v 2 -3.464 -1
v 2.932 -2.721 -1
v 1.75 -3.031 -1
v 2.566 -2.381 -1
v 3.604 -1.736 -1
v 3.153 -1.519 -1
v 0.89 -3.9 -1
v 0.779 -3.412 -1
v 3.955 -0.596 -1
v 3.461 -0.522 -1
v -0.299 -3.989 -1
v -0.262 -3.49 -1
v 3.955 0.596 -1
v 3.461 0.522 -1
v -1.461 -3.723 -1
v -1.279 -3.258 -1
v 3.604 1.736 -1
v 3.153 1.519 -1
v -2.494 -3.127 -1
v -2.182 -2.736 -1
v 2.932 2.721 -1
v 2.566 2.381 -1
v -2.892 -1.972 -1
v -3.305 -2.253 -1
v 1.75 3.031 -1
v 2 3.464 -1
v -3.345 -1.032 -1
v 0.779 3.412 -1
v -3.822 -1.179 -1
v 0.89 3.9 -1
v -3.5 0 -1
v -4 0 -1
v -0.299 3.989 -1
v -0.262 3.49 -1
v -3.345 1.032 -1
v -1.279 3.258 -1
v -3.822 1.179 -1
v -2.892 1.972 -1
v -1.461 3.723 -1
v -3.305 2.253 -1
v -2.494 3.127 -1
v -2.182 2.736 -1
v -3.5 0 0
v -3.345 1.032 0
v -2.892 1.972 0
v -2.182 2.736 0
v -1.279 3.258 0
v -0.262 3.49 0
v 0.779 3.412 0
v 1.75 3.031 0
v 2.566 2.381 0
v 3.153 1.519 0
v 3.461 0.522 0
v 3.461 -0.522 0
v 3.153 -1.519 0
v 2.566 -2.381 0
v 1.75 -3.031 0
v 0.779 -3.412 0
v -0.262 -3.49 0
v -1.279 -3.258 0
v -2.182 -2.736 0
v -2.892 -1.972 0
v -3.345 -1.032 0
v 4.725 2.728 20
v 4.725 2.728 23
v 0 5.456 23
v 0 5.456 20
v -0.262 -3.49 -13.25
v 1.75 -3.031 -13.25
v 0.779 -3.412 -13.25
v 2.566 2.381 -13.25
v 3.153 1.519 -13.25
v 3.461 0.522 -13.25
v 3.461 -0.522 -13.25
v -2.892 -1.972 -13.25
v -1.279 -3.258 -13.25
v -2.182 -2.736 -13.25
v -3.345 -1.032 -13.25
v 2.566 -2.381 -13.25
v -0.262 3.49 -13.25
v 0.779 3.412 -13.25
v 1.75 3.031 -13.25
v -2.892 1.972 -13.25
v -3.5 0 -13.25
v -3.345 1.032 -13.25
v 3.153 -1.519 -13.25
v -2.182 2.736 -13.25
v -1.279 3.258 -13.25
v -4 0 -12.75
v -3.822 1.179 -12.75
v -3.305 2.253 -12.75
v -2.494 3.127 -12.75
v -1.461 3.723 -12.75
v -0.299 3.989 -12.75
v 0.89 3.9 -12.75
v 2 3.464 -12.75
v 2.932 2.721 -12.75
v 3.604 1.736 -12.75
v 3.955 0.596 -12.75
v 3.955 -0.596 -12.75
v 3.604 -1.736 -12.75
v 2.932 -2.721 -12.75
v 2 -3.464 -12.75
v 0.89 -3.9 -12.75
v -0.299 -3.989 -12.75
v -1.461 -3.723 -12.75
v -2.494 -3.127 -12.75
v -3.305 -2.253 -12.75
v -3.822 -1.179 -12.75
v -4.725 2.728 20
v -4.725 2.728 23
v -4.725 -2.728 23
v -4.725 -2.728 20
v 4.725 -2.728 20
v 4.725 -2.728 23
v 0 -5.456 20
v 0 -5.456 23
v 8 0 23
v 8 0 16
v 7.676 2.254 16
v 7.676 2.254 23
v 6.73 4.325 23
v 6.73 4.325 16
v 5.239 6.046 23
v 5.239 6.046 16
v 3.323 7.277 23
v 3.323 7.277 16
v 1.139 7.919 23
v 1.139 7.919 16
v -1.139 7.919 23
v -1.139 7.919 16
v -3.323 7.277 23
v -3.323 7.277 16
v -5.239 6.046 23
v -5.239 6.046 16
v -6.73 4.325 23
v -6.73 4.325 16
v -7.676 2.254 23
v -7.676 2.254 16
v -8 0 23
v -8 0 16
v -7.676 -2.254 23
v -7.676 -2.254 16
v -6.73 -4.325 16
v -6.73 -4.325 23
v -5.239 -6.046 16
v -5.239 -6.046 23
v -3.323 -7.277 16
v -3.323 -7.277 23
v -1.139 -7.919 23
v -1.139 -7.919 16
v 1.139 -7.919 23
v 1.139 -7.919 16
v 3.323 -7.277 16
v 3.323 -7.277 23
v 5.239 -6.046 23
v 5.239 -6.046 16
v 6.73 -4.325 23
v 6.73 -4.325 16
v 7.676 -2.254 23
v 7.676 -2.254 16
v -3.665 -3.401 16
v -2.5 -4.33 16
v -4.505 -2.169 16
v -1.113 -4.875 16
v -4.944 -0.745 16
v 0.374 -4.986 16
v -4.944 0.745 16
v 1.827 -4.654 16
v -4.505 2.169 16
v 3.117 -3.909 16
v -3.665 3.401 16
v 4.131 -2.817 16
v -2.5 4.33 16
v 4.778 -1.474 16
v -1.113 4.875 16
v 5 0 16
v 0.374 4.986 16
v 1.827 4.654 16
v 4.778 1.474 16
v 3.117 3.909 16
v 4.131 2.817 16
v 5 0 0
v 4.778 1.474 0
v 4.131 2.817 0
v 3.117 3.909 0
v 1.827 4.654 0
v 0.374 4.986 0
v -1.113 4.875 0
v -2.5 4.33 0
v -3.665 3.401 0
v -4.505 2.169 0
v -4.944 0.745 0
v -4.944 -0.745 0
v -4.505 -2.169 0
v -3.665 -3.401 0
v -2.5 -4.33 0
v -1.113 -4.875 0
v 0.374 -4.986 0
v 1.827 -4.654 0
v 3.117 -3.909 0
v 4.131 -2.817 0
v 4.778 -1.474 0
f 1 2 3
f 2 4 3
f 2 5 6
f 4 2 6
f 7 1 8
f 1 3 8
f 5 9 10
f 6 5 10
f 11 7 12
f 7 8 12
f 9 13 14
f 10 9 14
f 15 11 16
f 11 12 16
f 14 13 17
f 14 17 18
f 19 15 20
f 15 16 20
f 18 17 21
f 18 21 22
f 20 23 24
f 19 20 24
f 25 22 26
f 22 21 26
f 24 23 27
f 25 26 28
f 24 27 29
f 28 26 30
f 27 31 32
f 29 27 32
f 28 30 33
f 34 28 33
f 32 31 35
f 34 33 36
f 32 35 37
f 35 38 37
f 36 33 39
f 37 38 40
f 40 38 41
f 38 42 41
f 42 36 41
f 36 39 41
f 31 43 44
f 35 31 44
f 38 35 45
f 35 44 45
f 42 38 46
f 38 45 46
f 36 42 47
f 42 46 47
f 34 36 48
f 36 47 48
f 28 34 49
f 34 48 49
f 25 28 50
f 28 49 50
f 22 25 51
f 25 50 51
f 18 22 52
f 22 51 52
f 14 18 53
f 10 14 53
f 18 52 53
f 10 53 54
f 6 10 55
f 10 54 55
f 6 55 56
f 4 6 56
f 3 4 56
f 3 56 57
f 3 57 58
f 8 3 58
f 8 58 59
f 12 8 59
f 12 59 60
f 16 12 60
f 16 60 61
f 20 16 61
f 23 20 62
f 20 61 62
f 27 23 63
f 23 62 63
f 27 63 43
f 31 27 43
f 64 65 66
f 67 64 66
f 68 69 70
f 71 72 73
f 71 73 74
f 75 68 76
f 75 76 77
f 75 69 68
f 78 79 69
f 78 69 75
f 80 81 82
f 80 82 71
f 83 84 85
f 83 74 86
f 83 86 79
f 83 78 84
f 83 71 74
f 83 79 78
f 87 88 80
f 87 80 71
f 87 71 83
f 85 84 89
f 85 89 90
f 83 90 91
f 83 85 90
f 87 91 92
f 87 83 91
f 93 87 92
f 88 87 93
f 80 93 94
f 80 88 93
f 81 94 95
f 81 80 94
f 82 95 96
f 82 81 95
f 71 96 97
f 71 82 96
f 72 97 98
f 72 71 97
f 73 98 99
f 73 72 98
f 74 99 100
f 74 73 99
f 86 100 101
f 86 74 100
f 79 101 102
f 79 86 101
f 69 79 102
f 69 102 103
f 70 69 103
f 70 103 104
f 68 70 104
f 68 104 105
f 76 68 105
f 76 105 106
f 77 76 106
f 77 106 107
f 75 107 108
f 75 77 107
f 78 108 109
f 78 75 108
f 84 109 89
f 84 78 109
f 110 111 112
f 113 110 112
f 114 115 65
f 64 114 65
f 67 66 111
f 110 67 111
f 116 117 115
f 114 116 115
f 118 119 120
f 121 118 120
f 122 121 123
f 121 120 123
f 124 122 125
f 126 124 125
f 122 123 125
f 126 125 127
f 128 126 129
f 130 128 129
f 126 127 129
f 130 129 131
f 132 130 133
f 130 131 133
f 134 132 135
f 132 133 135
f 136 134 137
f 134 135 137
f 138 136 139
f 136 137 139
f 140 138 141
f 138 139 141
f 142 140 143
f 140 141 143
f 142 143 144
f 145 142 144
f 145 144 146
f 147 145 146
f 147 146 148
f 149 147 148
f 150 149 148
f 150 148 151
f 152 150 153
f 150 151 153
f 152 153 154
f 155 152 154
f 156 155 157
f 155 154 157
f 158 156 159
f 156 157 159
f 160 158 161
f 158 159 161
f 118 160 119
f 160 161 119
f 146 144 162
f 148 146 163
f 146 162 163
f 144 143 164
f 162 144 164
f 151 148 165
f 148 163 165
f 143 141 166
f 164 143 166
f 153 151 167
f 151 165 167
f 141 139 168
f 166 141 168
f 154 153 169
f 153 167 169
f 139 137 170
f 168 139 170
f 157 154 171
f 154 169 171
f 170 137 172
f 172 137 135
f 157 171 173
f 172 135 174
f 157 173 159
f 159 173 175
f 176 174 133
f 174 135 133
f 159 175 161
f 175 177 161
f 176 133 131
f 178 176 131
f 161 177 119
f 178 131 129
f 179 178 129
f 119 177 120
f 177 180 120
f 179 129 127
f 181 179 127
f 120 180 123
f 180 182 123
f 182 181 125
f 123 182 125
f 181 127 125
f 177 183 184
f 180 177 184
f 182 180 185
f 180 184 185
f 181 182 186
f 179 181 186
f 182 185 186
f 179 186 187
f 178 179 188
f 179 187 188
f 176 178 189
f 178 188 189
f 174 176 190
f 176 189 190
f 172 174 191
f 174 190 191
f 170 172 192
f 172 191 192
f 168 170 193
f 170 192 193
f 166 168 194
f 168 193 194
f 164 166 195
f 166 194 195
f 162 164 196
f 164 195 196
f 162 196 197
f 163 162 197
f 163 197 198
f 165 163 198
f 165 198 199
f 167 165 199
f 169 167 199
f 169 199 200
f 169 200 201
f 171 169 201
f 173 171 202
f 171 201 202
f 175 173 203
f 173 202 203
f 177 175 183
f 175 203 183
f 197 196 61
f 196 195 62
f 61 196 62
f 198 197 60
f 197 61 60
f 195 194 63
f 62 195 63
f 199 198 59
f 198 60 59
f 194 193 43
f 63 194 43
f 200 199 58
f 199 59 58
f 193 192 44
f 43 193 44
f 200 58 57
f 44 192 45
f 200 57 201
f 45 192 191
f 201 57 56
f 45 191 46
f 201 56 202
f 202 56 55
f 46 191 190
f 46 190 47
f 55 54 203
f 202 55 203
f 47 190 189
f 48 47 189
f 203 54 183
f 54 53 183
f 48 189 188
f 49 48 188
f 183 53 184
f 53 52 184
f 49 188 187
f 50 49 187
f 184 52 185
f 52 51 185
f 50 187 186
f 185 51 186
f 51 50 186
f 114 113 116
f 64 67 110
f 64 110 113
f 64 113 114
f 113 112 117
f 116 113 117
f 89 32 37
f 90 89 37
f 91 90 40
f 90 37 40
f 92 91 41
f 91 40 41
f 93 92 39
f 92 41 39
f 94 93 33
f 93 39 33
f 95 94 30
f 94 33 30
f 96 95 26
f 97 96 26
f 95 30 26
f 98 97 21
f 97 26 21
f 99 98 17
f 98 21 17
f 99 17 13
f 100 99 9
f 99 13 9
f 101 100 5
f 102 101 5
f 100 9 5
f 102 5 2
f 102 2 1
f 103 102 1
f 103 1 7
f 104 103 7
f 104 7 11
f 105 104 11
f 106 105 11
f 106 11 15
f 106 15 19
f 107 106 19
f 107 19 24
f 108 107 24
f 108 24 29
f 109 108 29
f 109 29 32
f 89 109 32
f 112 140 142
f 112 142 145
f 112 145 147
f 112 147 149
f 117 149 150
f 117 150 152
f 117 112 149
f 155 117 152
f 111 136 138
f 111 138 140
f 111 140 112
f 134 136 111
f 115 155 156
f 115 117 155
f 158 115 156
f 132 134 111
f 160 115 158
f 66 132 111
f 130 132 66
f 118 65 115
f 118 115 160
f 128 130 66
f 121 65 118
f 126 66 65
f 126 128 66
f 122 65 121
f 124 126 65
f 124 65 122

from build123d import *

# Parameters (mm, degrees)
SKETCH_2_R          = 5
EXTRUDE_1_DEPTH     = 16
SKETCH_3_R          = 8
EXTRUDE_2_DEPTH     = 7
SKETCH_4_R          = 4
EXTRUDE_3_DEPTH     = 13.25
CUT_EXTRUDE_1_DEPTH = 3
CHAMFER_1_SIZE      = 0.5
SKETCH_6_R          = 4
SKETCH_6_R_2        = 3.5
CUT_EXTRUDE_2_DEPTH = 1


with BuildPart() as part:
    # 草图2 → 凸台-拉伸1 (new body)
    with BuildSketch(Plane.XY):
        Circle(SKETCH_2_R)
    extrude(amount=EXTRUDE_1_DEPTH)

    # 草图3 → 凸台-拉伸2 (add)
    with BuildSketch(Plane.XY.offset(16)):
        Circle(SKETCH_3_R)
    extrude(amount=EXTRUDE_2_DEPTH)

    # 草图4 → 凸台-拉伸3 (add)
    with BuildSketch(Plane(origin=(0, 0, 0), x_dir=(-1, 0, 0), z_dir=(0, 0, -1))):
        Circle(SKETCH_4_R)
    extrude(amount=EXTRUDE_3_DEPTH)

    # 草图5 → 切除-拉伸1 (cut)
    with BuildSketch(Plane.XY.offset(23)):
        Polygon((0, 5.456235198), (-4.72523829, 2.728117599), (-4.72523829, -2.728117599), (0, -5.456235198), (4.72523829, -2.728117599), (4.72523829, 2.728117599), align=None)
    extrude(amount=-CUT_EXTRUDE_1_DEPTH, mode=Mode.SUBTRACT)

    # 倒角1
    chamfer_1_edges = [part.edges().sort_by_distance(p)[0] for p in [
        (4, 0, -13.25),
    ]]
    chamfer(chamfer_1_edges, length=CHAMFER_1_SIZE)

    # 草图6 → 切除-拉伸2 (cut)
    with BuildSketch(Plane(origin=(0, 0, 0), x_dir=(-1, 0, 0), z_dir=(0, 0, -1))):
        Circle(SKETCH_6_R)
        Circle(SKETCH_6_R_2, mode=Mode.SUBTRACT)
    extrude(amount=CUT_EXTRUDE_2_DEPTH, mode=Mode.SUBTRACT)


solid = part.part
